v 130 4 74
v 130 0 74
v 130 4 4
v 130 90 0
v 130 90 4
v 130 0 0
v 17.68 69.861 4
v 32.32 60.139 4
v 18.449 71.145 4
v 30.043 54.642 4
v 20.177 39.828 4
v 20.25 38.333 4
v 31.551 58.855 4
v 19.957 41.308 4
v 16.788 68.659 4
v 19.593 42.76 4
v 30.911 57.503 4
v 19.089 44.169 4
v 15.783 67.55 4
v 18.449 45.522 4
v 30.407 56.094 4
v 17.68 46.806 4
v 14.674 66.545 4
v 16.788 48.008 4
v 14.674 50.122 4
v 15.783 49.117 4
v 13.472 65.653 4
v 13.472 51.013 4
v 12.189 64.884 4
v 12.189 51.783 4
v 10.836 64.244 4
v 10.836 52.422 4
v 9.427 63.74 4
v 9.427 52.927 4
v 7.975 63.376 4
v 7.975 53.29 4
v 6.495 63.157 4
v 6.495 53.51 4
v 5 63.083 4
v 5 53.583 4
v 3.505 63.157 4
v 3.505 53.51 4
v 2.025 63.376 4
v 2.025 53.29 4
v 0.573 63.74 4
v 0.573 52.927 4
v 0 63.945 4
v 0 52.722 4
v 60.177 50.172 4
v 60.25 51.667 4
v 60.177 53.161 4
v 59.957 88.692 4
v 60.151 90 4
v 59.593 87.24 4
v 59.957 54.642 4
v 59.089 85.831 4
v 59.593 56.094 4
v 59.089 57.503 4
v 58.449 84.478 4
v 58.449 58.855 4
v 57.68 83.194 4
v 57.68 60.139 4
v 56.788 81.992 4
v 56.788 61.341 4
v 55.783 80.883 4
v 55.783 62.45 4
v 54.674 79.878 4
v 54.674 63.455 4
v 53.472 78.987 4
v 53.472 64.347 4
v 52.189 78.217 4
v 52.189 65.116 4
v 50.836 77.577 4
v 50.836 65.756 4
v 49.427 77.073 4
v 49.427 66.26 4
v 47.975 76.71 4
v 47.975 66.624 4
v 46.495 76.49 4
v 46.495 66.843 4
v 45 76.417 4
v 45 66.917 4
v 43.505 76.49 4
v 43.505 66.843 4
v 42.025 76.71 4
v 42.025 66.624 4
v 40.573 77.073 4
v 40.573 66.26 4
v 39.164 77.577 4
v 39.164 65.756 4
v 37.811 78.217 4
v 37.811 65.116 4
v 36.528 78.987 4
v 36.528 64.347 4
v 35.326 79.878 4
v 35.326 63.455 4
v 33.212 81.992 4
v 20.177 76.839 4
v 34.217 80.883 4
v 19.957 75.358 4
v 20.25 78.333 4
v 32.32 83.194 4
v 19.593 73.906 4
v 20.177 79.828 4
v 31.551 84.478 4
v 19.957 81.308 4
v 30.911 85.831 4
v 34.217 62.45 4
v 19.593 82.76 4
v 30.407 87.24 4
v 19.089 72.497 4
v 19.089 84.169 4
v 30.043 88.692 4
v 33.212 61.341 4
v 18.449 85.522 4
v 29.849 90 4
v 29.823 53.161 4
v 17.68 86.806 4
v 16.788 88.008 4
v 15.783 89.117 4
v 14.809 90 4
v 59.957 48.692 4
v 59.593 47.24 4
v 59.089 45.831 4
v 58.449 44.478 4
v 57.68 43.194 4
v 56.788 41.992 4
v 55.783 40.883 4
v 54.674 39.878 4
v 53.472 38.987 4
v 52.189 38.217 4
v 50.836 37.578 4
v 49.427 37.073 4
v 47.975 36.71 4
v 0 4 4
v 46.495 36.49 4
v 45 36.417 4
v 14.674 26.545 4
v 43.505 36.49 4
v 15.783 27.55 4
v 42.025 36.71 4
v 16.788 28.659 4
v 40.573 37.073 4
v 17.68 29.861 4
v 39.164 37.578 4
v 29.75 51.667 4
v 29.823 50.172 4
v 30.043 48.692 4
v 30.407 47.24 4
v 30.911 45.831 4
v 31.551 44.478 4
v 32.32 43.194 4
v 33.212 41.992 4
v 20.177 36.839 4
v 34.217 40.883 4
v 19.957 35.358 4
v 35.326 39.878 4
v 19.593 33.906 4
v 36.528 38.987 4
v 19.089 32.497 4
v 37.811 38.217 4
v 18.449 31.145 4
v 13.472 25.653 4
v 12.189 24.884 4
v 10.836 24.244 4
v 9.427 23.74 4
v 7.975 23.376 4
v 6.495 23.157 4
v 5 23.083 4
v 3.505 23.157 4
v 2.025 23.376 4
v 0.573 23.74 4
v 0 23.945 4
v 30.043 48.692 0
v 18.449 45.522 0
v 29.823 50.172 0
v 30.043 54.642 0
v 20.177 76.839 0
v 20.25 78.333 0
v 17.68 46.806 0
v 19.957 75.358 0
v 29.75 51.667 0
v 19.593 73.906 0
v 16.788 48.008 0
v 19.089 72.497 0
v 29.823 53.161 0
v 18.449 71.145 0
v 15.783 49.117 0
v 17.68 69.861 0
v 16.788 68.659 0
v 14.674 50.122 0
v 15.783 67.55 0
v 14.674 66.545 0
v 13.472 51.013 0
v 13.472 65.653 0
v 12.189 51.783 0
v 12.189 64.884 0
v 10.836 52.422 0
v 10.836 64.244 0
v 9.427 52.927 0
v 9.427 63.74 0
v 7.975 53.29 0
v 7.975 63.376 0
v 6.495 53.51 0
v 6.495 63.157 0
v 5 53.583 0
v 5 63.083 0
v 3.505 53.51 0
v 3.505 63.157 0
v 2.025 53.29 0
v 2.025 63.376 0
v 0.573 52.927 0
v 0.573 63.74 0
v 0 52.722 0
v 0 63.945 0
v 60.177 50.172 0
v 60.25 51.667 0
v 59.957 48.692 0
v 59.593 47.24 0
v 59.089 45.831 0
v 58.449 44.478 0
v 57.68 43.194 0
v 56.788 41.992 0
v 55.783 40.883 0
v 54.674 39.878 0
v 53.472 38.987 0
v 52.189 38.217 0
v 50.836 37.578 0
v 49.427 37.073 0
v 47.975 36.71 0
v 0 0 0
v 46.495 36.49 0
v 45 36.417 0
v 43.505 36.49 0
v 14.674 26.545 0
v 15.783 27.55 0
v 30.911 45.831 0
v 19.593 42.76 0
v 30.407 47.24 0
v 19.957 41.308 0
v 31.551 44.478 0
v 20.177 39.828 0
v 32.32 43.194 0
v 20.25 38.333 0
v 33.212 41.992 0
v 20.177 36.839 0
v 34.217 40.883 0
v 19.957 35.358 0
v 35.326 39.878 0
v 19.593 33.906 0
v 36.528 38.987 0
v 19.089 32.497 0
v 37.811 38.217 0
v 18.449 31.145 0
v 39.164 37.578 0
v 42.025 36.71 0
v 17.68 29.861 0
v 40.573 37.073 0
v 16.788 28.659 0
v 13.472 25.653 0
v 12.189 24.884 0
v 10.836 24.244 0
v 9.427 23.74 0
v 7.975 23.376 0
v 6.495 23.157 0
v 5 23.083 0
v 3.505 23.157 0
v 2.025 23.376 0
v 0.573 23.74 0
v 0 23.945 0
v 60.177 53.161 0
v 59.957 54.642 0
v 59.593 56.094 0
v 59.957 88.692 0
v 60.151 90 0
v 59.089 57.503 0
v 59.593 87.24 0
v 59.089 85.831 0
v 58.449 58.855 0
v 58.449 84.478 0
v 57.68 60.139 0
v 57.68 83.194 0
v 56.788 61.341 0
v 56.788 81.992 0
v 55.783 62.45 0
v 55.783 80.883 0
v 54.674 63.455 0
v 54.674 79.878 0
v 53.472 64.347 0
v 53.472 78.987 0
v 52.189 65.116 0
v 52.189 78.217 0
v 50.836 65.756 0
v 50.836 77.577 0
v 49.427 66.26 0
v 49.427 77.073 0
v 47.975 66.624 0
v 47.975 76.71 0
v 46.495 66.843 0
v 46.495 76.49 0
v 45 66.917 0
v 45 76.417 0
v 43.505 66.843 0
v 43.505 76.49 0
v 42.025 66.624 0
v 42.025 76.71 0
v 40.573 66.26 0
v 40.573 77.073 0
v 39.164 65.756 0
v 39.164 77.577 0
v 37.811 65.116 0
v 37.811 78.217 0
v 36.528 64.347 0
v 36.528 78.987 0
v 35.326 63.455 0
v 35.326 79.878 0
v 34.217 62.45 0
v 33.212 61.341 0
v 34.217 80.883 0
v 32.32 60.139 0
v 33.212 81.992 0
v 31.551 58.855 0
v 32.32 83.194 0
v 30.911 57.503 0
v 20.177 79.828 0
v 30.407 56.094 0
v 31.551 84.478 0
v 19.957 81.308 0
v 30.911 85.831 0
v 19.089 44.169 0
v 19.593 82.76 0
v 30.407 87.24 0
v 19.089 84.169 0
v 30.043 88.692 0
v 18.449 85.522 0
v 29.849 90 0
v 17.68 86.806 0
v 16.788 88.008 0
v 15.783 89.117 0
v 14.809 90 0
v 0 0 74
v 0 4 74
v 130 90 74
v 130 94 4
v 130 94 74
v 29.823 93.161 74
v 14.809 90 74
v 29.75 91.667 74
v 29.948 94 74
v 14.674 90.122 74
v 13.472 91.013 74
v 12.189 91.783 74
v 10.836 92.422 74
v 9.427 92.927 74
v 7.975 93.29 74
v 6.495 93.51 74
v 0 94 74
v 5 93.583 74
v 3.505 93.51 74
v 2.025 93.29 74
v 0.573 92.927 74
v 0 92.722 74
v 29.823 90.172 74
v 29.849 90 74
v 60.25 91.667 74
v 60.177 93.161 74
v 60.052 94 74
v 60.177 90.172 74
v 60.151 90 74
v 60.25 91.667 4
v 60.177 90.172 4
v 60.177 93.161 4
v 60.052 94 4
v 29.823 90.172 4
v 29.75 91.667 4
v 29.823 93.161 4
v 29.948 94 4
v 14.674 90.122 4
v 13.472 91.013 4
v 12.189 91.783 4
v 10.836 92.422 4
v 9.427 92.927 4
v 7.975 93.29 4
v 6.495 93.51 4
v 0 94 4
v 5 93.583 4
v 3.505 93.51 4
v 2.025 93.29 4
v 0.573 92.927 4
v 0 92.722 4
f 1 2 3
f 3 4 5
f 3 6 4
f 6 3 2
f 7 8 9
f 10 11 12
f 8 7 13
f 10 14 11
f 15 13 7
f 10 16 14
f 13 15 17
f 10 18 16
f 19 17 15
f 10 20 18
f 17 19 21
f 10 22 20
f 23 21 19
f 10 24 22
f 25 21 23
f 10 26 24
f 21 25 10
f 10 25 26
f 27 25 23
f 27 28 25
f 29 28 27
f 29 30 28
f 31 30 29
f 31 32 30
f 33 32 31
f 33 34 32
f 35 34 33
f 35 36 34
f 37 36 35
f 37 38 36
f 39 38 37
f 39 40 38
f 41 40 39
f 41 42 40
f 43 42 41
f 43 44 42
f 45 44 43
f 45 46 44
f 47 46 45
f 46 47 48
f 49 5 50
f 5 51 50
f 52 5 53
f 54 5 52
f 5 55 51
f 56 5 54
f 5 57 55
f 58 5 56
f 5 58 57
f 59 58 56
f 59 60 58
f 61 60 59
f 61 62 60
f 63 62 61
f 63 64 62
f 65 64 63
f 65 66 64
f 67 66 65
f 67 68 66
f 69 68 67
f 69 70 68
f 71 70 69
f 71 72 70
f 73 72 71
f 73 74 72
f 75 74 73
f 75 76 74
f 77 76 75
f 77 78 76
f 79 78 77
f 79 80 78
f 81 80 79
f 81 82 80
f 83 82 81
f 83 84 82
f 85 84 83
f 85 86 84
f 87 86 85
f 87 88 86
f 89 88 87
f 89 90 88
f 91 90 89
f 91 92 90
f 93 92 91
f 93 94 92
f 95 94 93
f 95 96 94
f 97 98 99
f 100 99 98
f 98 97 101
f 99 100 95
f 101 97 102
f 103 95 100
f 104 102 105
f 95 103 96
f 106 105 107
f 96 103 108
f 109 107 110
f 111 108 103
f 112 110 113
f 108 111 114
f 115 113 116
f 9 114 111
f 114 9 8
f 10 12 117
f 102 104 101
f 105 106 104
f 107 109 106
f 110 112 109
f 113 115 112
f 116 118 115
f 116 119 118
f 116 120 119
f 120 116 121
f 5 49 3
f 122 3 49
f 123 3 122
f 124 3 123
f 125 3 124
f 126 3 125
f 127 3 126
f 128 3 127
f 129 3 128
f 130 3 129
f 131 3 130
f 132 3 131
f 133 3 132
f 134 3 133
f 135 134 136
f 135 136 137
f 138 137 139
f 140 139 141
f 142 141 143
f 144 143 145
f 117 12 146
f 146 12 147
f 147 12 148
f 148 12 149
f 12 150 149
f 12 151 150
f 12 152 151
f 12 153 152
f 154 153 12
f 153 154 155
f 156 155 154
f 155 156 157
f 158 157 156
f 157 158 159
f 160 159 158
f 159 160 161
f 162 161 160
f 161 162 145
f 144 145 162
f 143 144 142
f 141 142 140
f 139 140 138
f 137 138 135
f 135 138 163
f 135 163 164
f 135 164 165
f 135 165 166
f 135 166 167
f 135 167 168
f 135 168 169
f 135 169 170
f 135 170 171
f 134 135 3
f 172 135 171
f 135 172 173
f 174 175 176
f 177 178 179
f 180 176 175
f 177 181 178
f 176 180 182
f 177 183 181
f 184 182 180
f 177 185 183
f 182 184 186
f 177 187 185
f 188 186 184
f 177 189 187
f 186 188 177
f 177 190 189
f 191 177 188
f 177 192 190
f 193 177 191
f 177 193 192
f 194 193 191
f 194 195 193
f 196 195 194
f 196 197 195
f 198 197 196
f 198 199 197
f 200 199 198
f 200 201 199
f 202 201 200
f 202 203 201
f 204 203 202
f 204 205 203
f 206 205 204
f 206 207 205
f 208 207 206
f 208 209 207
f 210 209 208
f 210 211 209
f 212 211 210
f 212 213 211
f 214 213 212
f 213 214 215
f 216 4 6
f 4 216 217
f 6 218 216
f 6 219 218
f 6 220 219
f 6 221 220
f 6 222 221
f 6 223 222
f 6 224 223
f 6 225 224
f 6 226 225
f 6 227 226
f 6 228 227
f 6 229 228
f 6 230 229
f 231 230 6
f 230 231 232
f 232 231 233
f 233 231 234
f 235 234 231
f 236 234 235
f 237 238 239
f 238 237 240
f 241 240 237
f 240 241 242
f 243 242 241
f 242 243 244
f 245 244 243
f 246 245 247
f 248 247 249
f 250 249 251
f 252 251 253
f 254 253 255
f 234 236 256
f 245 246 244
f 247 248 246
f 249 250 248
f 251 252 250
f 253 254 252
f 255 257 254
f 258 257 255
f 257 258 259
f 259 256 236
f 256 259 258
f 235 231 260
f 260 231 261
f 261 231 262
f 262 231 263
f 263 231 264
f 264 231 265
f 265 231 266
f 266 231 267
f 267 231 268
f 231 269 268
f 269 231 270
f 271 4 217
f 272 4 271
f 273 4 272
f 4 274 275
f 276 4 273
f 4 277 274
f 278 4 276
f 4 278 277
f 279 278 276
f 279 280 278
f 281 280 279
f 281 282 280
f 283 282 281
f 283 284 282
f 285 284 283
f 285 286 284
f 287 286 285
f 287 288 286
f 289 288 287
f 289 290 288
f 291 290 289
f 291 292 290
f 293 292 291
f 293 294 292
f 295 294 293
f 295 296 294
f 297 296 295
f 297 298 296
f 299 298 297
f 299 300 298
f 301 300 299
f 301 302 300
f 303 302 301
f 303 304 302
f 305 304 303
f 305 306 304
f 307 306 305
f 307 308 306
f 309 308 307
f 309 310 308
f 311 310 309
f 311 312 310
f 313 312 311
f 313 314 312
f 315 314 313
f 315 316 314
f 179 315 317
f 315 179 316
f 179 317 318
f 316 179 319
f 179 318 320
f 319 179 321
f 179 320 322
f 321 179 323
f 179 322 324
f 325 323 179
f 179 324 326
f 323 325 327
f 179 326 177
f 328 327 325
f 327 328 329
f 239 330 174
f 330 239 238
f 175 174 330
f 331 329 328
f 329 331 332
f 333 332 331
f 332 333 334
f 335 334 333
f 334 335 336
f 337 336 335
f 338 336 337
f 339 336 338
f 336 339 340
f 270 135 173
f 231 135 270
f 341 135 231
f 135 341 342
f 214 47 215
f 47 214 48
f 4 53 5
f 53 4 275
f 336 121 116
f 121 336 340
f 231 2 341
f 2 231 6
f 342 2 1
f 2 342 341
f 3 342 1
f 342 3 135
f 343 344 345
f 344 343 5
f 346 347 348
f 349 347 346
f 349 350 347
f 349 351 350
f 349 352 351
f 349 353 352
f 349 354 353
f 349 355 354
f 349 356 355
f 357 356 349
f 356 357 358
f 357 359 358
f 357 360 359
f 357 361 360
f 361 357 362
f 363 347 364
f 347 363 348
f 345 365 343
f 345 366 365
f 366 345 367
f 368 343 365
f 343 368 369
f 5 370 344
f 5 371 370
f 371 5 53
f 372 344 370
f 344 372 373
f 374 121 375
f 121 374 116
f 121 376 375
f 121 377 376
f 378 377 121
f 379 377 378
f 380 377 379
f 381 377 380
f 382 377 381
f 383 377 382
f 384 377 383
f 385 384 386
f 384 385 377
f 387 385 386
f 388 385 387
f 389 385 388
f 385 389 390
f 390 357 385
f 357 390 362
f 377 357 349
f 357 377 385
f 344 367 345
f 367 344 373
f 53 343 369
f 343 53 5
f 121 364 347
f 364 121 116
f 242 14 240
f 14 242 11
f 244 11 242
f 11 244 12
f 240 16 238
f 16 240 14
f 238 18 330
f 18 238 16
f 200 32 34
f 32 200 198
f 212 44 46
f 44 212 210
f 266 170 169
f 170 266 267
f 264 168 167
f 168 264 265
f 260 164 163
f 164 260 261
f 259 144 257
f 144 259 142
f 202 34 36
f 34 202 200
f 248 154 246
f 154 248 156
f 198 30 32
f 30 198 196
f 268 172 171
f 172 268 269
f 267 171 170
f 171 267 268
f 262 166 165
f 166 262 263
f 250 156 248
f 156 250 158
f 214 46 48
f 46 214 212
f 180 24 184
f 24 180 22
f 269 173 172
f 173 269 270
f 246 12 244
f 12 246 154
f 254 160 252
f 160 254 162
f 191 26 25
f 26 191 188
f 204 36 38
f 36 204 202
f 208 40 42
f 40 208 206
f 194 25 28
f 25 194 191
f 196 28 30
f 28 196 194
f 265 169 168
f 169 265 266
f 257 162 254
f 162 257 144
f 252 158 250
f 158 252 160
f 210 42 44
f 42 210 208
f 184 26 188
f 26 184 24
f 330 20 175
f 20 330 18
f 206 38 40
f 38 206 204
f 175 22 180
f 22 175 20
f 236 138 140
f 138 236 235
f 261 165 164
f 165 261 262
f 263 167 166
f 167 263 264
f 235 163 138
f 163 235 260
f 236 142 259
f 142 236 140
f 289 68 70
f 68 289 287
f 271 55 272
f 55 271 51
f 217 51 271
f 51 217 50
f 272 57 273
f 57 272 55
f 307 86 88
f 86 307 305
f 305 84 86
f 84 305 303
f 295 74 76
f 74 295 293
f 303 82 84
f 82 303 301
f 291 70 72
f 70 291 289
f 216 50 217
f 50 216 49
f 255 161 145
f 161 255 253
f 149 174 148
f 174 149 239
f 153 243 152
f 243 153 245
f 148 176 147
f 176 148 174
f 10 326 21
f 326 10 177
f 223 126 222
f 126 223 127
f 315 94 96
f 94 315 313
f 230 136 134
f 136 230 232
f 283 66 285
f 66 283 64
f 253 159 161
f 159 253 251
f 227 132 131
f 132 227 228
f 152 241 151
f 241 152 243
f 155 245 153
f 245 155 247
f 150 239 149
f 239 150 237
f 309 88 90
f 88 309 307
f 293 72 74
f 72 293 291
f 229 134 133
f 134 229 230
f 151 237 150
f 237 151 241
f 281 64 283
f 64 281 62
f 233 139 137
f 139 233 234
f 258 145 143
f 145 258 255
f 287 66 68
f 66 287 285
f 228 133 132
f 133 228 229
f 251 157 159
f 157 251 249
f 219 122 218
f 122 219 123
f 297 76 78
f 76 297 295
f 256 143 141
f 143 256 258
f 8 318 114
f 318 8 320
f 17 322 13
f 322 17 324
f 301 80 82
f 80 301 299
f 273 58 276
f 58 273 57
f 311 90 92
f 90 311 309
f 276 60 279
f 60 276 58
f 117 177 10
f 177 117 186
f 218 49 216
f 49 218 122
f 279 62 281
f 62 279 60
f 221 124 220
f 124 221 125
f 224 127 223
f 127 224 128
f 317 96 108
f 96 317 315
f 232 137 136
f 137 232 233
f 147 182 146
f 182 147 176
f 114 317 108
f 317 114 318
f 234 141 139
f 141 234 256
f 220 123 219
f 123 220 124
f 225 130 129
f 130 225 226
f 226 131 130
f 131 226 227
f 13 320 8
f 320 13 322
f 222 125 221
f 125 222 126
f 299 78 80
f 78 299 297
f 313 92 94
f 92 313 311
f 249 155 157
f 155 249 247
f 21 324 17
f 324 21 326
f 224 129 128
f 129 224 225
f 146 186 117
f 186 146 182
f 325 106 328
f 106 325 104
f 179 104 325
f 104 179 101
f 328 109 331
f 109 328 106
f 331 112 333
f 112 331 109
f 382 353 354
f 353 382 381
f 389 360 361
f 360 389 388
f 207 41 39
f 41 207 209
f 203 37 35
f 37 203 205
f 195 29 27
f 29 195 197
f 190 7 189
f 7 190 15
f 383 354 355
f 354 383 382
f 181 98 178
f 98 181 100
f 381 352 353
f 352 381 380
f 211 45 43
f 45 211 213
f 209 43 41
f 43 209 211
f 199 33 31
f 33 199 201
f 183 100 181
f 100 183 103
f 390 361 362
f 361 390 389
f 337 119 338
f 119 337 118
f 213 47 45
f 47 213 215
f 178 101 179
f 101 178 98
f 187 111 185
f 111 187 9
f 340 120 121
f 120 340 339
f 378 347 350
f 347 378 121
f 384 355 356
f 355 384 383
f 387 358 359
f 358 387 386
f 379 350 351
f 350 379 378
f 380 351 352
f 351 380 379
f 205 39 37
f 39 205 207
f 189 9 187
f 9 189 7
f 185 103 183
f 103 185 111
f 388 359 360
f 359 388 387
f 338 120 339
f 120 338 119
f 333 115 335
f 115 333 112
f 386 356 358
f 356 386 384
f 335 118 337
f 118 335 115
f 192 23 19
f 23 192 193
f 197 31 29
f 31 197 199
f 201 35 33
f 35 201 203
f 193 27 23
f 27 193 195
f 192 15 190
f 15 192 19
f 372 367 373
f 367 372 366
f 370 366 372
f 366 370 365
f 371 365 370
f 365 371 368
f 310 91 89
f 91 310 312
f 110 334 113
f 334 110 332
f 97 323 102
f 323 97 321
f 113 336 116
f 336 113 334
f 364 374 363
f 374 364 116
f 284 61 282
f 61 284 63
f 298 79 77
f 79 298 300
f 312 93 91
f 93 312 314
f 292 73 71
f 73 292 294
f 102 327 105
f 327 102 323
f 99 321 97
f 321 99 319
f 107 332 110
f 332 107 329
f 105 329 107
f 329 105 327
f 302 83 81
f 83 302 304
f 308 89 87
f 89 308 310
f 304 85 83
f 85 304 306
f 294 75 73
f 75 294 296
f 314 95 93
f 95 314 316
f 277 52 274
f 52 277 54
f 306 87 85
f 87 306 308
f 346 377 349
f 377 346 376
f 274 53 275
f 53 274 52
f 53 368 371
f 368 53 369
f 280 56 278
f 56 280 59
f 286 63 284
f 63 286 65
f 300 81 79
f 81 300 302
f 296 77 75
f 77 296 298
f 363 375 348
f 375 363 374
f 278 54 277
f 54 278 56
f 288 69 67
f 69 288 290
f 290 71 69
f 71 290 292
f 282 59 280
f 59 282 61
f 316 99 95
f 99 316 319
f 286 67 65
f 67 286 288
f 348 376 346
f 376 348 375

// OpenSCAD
// Rack for six 50 mL conical (Falcon-type) tubes.
// Print orientation: Flat plate on bed (z=0), walls rising to z=70.
// After printing, flip over so walls are on the bed and tubes hang down.

// Plate dimensions
L     = 130;   // Length (X)
W     = 90;    // Width (Y)
t     = 4;     // Plate thickness (Z)

// Hole specifications
n_holes = 6;
hole_d  = 30.5;
// Grid layout: 2 rows (Y), 3 columns (X)
// Spacing 40mm centre-to-centre
dx = 40;
dy = 40;

// Wall specifications
wall_h = 70;   // Height of wall above plate
wall_t = 4;    // Wall thickness (Y)

// Derived positions
// Centring the grid on the plate
x_offset = (L - (n_holes - 1) * dx) / 2;
y_offset = (W - (2 - 1) * dy) / 2;

// Total height of the assembly (plate + wall)
total_h = t + wall_h;

$fn = 64;

difference() {
    // 1. Create the solid base (Plate + Walls)
    union() {
        // Base Plate
        translate([0, 0, 0])
            cube([L, W, t]);
        
        // Left Wall (at Y=0)
        // Starts at z=t, goes up to z=total_h
        translate([0, 0, t])
            cube([L, wall_t, wall_h]);
            
        // Right Wall (at Y=W)
        // Starts at z=t, goes up to z=total_h
        translate([0, W, t])
            cube([L, wall_t, wall_h]);
    }
    
    // 2. Subtract the 6 holes
    // Holes must extend slightly past the top of the walls to ensure clean cuts
    for (i = [0 : n_holes - 1]) {
        // Map index i to row and column
        // Rows are along Y (0 to 1), Columns along X (0 to 2)
        row = i / 3;
        col = i % 3;
        
        x_pos = x_offset + col * dx;
        y_pos = y_offset + row * dy;
        
        // Subtract cylinder extending past the top of the walls
        translate([x_pos, y_pos, 0])
            cylinder(h = total_h + 1, d = hole_d);
    }
}
